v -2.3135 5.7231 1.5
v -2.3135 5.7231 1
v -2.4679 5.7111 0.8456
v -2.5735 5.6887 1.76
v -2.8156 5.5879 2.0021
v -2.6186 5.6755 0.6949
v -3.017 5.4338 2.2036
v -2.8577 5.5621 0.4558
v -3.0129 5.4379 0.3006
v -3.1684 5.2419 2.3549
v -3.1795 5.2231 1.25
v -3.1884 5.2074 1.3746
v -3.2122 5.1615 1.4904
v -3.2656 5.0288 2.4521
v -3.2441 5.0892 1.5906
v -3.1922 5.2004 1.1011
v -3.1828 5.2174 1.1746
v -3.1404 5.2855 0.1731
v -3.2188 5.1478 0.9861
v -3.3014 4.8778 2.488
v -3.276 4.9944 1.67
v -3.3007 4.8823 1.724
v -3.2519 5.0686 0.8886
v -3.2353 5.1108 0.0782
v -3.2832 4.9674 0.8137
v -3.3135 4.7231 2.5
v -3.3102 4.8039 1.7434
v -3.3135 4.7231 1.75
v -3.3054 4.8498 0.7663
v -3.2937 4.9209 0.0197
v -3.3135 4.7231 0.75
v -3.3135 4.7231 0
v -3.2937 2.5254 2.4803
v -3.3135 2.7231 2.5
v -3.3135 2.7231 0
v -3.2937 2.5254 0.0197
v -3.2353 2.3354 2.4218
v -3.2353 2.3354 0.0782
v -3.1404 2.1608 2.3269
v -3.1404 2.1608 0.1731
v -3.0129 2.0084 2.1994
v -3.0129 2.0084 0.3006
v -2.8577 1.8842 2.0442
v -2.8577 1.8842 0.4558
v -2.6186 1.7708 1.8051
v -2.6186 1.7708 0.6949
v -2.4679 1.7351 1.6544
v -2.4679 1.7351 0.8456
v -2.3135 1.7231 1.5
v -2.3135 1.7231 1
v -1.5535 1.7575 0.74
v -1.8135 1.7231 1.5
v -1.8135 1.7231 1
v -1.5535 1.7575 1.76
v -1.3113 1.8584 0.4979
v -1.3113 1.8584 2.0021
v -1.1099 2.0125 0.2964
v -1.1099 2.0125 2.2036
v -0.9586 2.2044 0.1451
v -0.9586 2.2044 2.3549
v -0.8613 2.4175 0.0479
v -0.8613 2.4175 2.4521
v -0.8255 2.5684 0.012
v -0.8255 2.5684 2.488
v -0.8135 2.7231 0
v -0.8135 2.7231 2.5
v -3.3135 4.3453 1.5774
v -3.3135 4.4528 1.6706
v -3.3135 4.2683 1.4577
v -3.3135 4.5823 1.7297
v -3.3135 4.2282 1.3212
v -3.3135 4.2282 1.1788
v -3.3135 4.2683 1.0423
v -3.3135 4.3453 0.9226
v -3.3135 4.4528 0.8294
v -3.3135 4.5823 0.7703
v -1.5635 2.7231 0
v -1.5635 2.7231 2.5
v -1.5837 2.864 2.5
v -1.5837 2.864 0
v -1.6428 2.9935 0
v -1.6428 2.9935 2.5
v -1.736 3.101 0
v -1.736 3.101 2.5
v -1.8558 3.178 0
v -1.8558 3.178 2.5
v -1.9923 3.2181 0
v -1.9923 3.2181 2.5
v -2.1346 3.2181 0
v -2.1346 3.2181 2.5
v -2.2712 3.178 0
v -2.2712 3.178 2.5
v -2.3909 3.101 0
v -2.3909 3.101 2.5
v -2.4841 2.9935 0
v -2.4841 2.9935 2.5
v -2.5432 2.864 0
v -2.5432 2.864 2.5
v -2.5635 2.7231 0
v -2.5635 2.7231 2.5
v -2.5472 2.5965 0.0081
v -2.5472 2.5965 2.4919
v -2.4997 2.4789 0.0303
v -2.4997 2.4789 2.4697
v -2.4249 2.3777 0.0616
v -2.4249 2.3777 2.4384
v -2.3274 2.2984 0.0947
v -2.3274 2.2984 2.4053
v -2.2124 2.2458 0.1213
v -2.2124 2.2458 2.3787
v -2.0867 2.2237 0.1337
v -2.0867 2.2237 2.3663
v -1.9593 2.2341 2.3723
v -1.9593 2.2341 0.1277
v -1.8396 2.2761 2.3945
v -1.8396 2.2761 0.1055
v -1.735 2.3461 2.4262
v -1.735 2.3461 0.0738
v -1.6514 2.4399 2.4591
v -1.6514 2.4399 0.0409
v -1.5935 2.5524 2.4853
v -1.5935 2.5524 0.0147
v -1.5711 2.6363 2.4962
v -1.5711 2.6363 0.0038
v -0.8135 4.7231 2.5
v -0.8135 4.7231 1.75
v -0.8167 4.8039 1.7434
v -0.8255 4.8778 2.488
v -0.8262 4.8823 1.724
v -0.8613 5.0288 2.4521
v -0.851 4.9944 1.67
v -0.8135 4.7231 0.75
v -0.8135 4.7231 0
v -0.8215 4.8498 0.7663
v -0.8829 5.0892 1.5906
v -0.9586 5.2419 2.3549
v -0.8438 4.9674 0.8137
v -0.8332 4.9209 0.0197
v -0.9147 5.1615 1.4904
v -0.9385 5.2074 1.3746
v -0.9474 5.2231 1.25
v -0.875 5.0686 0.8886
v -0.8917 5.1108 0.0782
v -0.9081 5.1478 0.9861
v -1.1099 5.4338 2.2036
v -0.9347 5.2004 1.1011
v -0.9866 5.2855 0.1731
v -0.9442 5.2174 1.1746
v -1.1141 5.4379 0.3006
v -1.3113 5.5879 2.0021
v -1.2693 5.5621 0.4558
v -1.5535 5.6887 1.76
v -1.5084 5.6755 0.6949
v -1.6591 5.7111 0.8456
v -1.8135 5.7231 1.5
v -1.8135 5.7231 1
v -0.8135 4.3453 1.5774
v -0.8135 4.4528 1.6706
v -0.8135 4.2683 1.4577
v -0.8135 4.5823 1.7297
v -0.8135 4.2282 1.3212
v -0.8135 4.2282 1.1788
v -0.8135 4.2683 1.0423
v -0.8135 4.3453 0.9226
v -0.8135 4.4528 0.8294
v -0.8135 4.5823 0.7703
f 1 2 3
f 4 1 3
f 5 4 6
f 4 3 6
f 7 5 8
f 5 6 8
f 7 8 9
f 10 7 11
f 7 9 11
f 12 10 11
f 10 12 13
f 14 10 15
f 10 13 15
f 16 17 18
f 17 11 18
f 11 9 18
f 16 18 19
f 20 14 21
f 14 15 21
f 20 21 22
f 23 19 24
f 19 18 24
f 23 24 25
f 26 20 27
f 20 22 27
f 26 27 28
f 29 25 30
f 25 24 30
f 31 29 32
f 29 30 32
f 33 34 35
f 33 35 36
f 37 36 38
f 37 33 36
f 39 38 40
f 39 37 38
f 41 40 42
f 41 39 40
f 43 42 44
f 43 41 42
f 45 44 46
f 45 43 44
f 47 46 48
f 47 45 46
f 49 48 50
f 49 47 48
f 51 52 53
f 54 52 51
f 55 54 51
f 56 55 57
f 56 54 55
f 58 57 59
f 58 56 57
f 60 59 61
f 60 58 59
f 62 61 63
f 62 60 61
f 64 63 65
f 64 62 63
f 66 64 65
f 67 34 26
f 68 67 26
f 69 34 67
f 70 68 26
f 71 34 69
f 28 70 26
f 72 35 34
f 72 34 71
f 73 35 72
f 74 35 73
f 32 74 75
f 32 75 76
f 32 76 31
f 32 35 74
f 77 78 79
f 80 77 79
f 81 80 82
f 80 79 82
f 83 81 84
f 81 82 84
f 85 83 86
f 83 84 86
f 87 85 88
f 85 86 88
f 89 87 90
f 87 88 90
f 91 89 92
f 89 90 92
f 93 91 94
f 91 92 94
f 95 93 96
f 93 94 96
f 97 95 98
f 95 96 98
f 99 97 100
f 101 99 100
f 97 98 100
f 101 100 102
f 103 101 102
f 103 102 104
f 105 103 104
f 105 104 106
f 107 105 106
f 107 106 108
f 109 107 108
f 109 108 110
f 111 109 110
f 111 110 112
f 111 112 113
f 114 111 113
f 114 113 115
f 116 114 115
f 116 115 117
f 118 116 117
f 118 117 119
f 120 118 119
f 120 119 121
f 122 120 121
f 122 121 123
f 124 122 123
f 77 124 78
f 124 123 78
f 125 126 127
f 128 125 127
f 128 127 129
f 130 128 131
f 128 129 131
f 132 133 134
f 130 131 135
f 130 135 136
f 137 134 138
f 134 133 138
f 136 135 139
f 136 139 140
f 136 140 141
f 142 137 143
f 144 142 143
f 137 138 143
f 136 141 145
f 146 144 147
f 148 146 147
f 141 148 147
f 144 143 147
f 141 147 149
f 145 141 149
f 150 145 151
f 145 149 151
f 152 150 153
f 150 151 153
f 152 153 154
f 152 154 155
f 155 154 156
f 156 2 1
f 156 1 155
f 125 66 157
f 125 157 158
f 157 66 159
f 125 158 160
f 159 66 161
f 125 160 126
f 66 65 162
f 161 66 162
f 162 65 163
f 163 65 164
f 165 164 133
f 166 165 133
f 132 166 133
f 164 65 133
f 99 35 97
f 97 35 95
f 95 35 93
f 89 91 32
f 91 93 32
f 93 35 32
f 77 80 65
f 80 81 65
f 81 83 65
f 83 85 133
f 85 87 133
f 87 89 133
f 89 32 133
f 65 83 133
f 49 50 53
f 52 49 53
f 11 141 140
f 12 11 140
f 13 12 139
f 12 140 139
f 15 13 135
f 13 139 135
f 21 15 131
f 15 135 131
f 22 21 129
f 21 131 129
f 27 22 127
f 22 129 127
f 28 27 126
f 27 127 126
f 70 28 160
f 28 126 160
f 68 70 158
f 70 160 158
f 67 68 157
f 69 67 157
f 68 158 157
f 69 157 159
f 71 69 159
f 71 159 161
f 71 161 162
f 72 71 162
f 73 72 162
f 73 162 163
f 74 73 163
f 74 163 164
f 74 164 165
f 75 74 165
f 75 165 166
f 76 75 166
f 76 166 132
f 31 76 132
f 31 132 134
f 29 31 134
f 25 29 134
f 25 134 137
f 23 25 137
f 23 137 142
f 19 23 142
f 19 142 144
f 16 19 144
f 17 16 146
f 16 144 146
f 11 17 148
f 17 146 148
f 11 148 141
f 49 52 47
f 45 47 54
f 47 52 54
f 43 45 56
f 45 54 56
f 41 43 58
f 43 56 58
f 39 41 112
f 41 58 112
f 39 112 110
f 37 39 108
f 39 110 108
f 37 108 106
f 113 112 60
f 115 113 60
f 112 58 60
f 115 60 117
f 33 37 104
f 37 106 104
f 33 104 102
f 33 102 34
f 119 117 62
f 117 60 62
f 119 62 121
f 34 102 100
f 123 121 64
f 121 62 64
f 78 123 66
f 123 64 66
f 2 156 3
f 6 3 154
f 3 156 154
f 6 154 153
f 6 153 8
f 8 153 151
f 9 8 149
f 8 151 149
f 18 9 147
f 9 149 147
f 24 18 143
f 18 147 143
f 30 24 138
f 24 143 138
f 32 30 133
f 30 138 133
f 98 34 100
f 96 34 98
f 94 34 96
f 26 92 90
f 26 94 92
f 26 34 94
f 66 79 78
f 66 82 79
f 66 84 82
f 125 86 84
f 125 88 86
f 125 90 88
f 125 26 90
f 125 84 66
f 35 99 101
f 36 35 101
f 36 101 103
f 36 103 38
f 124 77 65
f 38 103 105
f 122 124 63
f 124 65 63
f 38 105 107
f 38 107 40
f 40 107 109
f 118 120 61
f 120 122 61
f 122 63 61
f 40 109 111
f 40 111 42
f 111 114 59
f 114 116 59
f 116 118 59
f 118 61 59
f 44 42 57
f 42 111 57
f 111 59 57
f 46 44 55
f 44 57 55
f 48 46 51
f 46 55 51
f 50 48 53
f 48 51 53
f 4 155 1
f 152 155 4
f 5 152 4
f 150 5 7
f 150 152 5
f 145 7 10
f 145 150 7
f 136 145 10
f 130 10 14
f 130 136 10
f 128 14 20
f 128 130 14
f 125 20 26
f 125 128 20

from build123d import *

# Parameters (mm, degrees)
CROQUIS1_W              = 2.5
CROQUIS1_H              = 4
SALIENTE_EXTRUIR1_DEPTH = 2.5
REDONDEO1_R             = 1
CROQUIS2_R              = 0.5
CORTAR_EXTRUIR1_DEPTH   = 2.5
CROQUIS4_R              = 0.5
CORTAR_EXTRUIR2_DEPTH   = 2.5
REDONDEO2_R             = 1
REDONDEO3_R             = 1


with BuildPart() as part:
    # Croquis1 → Saliente-Extruir1 (new body)
    with BuildSketch(Plane.XY):
        with Locations((-2.063472996, 3.723140496)):
            Rectangle(CROQUIS1_W, CROQUIS1_H)
    extrude(amount=SALIENTE_EXTRUIR1_DEPTH)

    # Redondeo1
    redondeo1_edges = [part.edges().sort_by_distance(p)[0] for p in [
        (-2.063472996, 5.723140496, 2.5),
        (-2.063472996, 5.723140496, 0),
        (-0.813472996, 1.723140496, 1.25),
        (-3.313472996, 1.723140496, 1.25),
    ]]
    fillet(redondeo1_edges, radius=REDONDEO1_R)

    # Croquis2 → Cortar-Extruir1 (cut)
    with BuildSketch(Plane(origin=(-0.813472996, 0, 0), x_dir=(0, 0, -1), z_dir=(1, 0, 0))):
        with Locations(Location((-1.25, 4.723140496, 0), (0, 0, 90))):
            Circle(CROQUIS2_R)
    extrude(amount=-CORTAR_EXTRUIR1_DEPTH, mode=Mode.SUBTRACT)

    # Croquis4 → Cortar-Extruir2 (cut)
    with BuildSketch(Plane.XY.offset(2.5)):
        with Locations((-2.063472996, 2.723140496)):
            Circle(CROQUIS4_R)
    extrude(amount=-CORTAR_EXTRUIR2_DEPTH, mode=Mode.SUBTRACT)

    # Redondeo2
    # the kernel refuses this fillet: 1 mm, written as the material it takes off along each edge
    with BuildSketch(Plane(origin=(-0.813472996, 5.723140496, -1.5), x_dir=(-1, 0, 0), z_dir=(0, 0, 1))) as redondeo2_piece_1:
        with BuildLine():
            CenterArc((REDONDEO2_R, REDONDEO2_R), REDONDEO2_R, 180, 90)
            Line((0, REDONDEO2_R), (0, 0))
            Line((0, 0), (REDONDEO2_R, 0))
        make_face()
    extrude(amount=5.5, mode=Mode.SUBTRACT)
    with BuildSketch(Plane(origin=(-3.313472996, 5.723140496, -1.5), x_dir=(1, 0, 0), z_dir=(0, 0, 1))) as redondeo2_piece_2:
        with BuildLine():
            CenterArc((REDONDEO2_R, -REDONDEO2_R), REDONDEO2_R, 90, 90)
            Line((0, -REDONDEO2_R), (0, 0))
            Line((0, 0), (REDONDEO2_R, 0))
        make_face()
    extrude(amount=5.5, mode=Mode.SUBTRACT)

    # Redondeo3
    # the kernel refuses this fillet: 1 mm, written as the material it takes off along each edge
    with BuildSketch(Plane(origin=(0.686527004, 1.723140496, 2.5), x_dir=(0, 1, 0), z_dir=(-1, 0, 0))) as redondeo3_piece_1:
        with BuildLine():
            CenterArc((REDONDEO3_R, REDONDEO3_R), REDONDEO3_R, 180, 90)
            Line((0, REDONDEO3_R), (0, 0))
            Line((0, 0), (REDONDEO3_R, 0))
        make_face()
    extrude(amount=5.5, mode=Mode.SUBTRACT)
    with BuildSketch(Plane(origin=(0.686527004, 1.723140496, 0), x_dir=(0, 1, 0), z_dir=(-1, 0, 0))) as redondeo3_piece_2:
        with BuildLine():
            CenterArc((REDONDEO3_R, -REDONDEO3_R), REDONDEO3_R, 90, 90)
            Line((0, -REDONDEO3_R), (0, 0))
            Line((0, 0), (REDONDEO3_R, 0))
        make_face()
    extrude(amount=5.5, mode=Mode.SUBTRACT)


solid = part.part
